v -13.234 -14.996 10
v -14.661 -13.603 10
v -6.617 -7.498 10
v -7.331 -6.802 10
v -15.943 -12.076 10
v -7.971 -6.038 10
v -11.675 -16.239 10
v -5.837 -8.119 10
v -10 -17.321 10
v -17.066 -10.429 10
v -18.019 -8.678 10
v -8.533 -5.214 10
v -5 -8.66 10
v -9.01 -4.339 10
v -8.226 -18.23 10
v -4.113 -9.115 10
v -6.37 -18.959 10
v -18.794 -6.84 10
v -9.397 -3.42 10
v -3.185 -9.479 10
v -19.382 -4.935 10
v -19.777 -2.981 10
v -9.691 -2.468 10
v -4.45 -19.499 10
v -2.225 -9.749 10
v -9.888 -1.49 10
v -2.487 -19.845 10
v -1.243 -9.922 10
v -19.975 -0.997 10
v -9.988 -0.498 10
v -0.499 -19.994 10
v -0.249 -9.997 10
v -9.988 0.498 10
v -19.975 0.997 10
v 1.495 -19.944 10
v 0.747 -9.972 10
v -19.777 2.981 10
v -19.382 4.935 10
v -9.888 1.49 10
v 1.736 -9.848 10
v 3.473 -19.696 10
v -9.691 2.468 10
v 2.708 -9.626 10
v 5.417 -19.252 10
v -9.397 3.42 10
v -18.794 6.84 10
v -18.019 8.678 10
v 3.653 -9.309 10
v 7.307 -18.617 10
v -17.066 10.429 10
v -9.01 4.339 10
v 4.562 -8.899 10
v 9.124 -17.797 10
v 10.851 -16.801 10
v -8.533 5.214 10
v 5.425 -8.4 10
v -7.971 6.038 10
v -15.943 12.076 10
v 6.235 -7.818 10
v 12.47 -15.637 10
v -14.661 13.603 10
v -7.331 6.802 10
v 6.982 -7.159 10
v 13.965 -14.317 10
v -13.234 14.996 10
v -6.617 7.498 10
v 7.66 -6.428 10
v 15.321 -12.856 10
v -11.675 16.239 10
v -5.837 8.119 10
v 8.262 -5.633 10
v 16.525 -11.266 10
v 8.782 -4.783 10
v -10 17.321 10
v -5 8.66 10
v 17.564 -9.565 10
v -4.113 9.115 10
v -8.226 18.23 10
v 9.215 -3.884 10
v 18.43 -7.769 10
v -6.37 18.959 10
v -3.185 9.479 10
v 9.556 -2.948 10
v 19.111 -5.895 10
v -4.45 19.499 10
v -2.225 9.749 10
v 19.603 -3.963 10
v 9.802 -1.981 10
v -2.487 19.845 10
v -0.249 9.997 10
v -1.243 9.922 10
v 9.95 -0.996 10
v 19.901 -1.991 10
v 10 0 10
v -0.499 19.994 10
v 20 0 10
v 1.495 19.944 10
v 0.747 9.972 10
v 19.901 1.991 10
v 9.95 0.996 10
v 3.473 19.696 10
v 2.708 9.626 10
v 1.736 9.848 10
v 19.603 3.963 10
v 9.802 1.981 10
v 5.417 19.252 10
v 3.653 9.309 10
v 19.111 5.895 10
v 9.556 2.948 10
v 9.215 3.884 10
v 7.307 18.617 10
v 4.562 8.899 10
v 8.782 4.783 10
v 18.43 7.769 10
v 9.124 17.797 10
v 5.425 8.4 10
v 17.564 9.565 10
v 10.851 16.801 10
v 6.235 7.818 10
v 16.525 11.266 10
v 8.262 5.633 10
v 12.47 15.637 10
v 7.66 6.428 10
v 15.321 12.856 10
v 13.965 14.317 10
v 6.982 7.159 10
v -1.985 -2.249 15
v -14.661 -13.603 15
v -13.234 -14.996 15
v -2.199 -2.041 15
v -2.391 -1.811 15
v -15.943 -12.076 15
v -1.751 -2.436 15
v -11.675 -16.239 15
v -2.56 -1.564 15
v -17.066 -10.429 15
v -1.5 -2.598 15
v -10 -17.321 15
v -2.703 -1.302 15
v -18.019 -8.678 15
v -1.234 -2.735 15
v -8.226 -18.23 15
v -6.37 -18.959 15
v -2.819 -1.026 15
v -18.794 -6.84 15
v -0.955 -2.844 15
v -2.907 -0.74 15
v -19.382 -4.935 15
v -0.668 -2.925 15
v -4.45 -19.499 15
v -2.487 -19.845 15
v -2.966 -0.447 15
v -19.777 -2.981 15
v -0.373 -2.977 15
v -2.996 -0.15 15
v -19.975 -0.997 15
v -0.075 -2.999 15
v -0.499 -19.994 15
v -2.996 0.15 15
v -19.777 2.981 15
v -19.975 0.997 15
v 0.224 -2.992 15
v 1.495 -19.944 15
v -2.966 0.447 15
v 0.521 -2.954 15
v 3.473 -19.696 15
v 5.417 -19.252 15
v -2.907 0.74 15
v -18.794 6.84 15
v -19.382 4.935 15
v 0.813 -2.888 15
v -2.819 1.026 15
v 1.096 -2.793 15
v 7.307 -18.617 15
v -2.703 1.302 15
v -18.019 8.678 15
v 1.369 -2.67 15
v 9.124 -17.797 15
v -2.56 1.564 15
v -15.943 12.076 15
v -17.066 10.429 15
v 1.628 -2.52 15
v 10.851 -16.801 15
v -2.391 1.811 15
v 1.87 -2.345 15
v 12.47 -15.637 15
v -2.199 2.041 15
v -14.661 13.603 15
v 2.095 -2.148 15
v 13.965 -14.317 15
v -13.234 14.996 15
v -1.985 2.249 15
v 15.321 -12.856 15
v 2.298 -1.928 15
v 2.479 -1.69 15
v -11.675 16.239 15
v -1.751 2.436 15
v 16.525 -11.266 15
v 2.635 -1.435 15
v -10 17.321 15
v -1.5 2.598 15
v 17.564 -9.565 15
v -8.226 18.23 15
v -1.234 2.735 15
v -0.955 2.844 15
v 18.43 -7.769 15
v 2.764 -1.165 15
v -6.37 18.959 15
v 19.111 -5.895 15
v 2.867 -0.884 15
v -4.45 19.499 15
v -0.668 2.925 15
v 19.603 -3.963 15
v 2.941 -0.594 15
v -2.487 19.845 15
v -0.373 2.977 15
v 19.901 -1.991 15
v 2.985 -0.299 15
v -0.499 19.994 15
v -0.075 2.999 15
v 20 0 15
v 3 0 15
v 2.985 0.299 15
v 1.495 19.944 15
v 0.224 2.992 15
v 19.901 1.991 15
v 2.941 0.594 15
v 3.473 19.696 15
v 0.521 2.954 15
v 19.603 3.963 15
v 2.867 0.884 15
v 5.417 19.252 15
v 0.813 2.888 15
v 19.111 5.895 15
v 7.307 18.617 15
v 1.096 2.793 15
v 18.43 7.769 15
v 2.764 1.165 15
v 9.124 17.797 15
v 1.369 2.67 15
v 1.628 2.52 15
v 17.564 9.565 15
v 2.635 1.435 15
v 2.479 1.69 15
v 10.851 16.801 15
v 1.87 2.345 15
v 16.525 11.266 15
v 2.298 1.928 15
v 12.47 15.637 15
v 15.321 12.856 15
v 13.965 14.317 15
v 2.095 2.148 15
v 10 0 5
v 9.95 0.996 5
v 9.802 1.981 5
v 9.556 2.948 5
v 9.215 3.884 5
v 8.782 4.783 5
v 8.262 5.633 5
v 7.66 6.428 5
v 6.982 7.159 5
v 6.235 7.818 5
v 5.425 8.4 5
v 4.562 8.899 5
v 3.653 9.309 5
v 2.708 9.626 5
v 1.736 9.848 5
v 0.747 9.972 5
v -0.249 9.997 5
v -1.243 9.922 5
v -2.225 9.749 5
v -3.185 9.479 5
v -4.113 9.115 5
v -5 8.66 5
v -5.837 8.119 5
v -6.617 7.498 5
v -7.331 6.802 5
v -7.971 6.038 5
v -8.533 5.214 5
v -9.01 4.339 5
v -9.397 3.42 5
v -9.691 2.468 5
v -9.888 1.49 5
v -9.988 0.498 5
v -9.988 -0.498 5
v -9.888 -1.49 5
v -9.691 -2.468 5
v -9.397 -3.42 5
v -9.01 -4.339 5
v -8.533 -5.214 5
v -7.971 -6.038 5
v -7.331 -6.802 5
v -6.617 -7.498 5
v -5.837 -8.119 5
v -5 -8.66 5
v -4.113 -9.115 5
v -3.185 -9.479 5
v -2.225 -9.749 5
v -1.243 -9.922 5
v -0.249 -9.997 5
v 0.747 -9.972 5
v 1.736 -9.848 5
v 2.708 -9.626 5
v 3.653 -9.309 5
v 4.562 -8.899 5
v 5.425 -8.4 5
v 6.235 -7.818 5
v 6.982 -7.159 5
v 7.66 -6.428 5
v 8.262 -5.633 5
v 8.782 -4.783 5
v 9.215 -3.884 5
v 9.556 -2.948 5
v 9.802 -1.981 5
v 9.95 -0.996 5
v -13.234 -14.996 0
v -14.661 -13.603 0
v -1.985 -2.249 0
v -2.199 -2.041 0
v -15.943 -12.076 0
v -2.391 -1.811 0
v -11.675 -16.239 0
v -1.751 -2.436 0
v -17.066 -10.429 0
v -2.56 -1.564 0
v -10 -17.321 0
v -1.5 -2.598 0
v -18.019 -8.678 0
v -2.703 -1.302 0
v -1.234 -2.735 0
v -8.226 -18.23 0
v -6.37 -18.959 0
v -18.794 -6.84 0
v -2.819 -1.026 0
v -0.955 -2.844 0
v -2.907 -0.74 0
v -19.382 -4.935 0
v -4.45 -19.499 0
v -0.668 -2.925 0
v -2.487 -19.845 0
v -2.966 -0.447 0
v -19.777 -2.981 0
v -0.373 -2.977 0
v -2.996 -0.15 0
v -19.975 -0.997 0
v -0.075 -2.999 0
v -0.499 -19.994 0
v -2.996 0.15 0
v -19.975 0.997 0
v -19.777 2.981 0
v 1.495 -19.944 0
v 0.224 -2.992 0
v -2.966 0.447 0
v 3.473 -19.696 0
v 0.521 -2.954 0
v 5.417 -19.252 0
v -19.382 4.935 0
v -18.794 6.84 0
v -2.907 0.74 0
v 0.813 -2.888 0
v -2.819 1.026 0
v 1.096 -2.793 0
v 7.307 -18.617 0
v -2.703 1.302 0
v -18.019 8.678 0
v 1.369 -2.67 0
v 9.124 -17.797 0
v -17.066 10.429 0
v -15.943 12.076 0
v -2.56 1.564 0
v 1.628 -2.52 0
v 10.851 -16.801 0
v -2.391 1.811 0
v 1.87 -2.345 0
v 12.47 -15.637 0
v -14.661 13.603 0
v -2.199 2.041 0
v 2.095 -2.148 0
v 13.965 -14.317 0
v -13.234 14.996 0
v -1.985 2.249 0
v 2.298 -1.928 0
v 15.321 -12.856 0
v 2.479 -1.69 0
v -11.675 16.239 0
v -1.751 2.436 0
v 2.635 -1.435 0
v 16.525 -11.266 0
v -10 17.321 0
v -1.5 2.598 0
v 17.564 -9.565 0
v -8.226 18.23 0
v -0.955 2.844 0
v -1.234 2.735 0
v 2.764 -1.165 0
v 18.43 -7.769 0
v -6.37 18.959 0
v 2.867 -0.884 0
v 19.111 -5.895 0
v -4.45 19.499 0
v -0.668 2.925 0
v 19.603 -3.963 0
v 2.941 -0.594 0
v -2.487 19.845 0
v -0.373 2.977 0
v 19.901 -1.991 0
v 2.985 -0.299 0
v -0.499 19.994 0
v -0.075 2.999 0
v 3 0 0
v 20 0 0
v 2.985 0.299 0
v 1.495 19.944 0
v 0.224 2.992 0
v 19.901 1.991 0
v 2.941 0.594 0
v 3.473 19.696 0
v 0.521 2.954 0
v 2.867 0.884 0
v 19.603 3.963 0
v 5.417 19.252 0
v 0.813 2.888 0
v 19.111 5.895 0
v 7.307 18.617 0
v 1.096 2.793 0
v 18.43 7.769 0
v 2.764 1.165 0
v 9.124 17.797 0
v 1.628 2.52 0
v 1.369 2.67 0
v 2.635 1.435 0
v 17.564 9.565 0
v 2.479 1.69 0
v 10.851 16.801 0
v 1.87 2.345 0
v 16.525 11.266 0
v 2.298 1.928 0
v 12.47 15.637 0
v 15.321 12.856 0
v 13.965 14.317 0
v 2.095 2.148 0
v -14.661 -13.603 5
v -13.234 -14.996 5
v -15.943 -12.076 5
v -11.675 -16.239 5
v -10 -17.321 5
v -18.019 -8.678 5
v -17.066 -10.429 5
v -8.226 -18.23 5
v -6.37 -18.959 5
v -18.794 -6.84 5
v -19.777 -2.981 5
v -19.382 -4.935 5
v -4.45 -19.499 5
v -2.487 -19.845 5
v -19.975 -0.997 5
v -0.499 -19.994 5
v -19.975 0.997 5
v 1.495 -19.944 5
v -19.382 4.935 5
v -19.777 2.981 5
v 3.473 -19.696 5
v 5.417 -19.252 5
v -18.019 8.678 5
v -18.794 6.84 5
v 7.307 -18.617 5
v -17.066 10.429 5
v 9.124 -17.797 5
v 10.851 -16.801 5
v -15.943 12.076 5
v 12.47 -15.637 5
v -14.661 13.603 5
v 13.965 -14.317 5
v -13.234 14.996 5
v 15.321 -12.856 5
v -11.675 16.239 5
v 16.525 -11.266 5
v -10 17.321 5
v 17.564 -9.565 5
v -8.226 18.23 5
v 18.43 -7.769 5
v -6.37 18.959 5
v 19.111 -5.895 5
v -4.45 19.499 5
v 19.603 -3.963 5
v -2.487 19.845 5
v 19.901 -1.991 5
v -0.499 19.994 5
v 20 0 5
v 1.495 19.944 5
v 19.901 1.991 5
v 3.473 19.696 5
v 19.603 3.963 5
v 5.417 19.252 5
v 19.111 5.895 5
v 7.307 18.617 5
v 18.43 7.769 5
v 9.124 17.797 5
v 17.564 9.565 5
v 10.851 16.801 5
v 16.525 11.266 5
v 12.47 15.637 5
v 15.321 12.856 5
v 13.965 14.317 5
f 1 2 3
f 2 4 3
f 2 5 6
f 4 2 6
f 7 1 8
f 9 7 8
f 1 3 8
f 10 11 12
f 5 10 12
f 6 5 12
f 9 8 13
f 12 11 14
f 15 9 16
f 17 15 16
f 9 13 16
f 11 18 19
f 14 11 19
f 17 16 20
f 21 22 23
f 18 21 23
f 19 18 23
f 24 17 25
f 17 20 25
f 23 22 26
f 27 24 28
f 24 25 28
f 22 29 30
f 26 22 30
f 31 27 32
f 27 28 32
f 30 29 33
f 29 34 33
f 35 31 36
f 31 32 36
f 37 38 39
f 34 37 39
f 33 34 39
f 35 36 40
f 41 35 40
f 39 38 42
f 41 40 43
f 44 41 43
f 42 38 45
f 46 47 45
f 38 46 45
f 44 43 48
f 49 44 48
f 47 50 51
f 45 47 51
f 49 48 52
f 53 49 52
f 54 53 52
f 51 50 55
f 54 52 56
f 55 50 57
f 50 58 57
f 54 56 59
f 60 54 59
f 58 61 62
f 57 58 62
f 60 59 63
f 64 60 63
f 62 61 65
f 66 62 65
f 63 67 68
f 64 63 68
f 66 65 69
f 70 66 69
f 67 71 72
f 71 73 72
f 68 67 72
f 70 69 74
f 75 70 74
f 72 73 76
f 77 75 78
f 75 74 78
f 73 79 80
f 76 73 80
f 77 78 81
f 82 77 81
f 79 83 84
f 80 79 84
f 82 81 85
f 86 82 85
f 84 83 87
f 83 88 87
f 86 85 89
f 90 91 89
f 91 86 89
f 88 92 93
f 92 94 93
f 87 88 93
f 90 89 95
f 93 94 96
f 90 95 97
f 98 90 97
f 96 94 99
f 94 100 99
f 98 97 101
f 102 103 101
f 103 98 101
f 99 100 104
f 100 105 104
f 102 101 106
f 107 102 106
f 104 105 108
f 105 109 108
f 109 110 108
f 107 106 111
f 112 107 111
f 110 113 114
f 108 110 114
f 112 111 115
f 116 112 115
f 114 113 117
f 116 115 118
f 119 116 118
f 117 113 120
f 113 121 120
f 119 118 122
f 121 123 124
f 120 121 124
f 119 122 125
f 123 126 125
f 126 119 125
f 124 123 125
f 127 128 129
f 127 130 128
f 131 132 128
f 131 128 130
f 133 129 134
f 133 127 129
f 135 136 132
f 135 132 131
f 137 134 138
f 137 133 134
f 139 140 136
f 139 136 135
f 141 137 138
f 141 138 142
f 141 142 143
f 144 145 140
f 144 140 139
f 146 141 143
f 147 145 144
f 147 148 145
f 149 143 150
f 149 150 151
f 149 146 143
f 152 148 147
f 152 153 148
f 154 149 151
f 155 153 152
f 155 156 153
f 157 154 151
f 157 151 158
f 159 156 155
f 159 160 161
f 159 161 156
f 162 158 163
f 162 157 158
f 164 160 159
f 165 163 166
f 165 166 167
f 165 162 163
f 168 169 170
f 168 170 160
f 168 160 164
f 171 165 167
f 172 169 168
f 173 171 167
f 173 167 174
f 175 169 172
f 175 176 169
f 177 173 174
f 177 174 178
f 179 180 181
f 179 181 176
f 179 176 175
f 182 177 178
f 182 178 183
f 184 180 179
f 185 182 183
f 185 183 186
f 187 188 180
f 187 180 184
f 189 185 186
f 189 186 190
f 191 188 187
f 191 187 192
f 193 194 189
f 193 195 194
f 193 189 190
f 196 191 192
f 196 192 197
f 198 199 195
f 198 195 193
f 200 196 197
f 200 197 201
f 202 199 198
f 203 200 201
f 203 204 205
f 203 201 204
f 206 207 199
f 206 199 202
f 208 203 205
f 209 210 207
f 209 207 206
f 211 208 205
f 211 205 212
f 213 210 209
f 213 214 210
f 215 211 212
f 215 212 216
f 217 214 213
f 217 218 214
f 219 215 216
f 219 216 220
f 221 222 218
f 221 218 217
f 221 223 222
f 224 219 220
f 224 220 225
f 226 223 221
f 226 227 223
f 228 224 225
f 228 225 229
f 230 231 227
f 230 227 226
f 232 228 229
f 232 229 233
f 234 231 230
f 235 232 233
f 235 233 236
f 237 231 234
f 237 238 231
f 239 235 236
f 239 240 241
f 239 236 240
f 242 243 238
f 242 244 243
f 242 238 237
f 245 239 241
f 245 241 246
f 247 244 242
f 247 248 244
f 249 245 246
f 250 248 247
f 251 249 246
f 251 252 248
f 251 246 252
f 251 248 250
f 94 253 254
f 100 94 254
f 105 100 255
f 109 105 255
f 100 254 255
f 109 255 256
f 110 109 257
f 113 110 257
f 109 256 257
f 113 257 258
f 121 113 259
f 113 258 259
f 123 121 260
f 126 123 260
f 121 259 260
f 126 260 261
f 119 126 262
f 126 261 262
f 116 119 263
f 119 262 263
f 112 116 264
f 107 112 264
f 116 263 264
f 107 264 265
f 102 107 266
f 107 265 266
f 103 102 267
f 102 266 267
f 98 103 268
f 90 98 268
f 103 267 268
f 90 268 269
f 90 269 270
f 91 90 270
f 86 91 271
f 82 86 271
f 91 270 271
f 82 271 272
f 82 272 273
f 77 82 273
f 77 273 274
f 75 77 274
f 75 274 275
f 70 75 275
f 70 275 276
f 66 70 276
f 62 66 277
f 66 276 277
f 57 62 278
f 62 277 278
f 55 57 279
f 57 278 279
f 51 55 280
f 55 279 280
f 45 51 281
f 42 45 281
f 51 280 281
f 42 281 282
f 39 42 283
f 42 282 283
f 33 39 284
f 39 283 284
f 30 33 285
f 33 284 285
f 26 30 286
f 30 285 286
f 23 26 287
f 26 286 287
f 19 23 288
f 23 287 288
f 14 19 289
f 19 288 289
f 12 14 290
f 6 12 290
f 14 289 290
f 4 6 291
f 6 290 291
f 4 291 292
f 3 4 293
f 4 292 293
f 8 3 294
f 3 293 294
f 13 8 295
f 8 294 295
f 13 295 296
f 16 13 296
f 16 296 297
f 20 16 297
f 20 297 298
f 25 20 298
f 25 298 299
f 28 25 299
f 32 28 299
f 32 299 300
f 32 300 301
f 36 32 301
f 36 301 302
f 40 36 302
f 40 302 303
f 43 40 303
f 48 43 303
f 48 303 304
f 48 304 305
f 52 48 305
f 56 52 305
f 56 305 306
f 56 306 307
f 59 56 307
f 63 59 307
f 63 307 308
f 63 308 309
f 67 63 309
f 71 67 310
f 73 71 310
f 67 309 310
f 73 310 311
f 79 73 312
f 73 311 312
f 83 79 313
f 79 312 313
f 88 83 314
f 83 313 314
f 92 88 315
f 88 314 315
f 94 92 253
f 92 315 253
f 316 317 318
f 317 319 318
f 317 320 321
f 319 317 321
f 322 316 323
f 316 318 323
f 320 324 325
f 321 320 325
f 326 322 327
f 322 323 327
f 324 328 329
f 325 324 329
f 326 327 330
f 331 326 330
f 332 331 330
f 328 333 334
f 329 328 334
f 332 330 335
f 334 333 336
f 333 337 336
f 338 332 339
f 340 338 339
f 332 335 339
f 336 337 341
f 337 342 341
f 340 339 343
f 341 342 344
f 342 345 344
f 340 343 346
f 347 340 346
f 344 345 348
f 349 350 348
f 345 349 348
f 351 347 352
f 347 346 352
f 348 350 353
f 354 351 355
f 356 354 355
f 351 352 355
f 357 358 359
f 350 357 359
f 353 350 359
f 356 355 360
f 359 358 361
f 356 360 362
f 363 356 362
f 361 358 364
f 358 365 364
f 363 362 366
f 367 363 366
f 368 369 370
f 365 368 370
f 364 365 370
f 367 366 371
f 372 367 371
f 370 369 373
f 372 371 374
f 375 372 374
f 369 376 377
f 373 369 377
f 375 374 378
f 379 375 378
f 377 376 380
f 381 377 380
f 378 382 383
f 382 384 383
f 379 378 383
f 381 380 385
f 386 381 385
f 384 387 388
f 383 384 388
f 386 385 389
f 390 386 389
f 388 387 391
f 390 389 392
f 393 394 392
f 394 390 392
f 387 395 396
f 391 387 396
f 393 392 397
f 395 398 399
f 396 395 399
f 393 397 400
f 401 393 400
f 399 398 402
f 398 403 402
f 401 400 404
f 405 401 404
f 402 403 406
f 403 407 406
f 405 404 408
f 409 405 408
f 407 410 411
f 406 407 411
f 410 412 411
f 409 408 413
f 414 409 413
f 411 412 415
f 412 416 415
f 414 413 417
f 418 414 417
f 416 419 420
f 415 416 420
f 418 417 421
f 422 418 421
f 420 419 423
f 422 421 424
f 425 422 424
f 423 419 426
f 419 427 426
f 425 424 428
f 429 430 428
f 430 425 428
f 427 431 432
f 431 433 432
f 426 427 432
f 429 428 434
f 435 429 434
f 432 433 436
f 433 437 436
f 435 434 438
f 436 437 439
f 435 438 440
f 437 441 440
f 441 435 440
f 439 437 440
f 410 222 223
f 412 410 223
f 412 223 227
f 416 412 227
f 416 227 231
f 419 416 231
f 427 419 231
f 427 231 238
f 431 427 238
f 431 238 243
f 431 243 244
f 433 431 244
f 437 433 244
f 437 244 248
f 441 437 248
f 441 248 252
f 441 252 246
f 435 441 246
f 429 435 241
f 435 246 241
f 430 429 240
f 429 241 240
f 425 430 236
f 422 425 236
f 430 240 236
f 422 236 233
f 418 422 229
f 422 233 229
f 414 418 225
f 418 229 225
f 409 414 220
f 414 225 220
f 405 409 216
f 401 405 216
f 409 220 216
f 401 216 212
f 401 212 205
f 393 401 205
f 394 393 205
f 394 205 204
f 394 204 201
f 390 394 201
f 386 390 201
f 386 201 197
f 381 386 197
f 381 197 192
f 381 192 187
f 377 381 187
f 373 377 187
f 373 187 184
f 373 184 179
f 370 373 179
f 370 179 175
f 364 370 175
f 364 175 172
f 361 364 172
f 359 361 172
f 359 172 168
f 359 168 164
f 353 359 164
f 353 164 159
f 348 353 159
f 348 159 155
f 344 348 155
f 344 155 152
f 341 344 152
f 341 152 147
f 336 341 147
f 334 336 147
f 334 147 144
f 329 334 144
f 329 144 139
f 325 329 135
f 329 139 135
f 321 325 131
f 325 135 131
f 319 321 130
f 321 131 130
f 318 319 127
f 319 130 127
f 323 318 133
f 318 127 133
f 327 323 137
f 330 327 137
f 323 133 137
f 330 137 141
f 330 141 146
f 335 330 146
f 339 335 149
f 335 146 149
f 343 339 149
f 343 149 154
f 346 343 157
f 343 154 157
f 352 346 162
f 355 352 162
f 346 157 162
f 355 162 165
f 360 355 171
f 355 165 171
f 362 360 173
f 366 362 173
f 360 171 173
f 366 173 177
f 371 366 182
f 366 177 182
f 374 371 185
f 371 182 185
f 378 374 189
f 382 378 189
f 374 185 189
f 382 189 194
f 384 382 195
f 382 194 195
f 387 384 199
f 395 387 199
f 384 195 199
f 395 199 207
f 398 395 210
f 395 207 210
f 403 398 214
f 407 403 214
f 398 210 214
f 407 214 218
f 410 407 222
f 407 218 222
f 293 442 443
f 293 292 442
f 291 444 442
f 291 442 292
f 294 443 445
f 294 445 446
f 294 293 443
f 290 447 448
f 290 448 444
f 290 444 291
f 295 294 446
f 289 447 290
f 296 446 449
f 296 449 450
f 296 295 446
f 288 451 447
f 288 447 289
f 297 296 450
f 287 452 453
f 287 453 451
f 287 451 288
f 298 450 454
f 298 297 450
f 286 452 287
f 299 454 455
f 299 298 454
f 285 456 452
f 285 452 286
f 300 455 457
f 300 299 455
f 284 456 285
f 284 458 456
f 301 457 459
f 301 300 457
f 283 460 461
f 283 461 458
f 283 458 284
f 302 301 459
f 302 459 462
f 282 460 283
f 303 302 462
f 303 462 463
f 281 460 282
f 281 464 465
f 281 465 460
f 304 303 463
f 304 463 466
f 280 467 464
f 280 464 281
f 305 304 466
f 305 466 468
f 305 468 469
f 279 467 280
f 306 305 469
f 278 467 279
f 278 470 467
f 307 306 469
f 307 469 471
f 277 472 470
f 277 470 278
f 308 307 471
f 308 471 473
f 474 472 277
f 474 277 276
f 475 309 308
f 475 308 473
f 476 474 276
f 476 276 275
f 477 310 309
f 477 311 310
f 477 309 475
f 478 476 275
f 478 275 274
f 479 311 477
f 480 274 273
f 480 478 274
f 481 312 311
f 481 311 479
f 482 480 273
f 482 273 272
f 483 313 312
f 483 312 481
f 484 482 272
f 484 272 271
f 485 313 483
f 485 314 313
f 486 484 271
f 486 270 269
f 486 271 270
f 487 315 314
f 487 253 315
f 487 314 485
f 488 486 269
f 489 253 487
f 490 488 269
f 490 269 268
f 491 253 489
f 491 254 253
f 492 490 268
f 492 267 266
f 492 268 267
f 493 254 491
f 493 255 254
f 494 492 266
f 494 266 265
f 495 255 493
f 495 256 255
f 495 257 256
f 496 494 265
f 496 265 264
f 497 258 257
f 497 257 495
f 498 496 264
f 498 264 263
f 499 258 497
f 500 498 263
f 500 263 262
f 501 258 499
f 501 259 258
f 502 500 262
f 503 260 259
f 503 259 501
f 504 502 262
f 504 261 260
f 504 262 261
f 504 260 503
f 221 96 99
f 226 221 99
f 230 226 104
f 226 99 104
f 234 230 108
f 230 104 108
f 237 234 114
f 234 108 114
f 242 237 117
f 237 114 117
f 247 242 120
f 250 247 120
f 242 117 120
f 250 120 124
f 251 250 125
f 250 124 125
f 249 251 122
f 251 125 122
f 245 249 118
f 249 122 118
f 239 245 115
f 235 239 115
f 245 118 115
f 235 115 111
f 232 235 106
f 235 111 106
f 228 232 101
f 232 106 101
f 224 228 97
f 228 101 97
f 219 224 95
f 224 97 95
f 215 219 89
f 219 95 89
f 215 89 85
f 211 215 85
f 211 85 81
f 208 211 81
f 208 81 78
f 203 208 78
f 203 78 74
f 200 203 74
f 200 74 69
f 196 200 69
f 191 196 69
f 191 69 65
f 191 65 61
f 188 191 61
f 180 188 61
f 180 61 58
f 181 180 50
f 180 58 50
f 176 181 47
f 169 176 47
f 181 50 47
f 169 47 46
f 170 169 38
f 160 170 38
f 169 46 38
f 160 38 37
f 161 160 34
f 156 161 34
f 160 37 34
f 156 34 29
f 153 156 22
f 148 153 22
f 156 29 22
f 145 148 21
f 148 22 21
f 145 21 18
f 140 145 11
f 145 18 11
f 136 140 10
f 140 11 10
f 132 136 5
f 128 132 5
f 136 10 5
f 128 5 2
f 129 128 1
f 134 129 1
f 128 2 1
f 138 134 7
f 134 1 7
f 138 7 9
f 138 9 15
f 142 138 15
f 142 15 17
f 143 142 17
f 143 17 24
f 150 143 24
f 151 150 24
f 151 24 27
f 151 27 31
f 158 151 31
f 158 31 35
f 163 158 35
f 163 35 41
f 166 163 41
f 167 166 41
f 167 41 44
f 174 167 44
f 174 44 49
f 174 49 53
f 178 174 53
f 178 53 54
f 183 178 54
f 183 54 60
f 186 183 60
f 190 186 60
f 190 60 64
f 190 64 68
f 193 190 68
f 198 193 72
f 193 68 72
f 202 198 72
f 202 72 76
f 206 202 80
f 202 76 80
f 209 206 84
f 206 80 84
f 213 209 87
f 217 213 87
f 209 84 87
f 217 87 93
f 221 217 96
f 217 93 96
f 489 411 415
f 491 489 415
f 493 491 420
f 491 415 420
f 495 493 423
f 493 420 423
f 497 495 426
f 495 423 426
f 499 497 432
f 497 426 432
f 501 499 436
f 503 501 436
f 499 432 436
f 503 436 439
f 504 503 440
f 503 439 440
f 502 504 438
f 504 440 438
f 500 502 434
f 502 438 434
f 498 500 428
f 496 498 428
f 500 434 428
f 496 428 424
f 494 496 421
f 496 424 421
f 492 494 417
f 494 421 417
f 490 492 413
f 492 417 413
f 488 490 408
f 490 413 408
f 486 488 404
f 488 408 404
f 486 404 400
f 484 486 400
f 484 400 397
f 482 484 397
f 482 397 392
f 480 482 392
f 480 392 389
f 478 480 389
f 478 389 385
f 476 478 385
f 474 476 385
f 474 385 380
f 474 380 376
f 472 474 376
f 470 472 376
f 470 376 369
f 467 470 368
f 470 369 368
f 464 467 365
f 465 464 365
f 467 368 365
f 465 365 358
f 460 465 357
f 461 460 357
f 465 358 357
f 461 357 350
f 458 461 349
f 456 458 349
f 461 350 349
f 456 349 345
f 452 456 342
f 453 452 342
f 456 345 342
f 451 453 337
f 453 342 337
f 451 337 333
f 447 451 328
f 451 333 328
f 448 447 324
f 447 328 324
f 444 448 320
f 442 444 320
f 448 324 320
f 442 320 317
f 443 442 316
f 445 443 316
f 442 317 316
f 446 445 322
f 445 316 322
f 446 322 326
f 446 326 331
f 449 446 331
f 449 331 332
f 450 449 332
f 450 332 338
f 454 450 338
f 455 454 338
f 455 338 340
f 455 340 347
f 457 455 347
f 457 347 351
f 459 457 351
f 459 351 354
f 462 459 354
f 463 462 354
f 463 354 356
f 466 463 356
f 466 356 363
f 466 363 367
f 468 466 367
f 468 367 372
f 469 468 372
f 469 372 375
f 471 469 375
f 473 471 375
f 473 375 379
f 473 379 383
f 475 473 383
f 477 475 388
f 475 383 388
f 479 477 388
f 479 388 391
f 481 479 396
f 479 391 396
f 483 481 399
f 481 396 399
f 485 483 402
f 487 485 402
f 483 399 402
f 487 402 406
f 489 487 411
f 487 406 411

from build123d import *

# Parameters (mm, degrees)
SKETCH1_R           = 20
BOSS_EXTRUDE1_DEPTH = 5
SKETCH2_R           = 10
BOSS_EXTRUDE2_DEPTH = 5
SKETCH3_R           = 20
BOSS_EXTRUDE3_DEPTH = 5
SKETCH4_R           = 3
CUT_EXTRUDE1_DEPTH  = 33.015621187


with BuildPart() as part:
    # Sketch1 → Boss-Extrude1 (new body)
    with BuildSketch(Plane.XY):
        Circle(SKETCH1_R)
    extrude(amount=BOSS_EXTRUDE1_DEPTH)

    # Sketch2 → Boss-Extrude2 (add)
    with BuildSketch(Plane.XY.offset(5)):
        Circle(SKETCH2_R)
    extrude(amount=BOSS_EXTRUDE2_DEPTH)

    # Sketch3 → Boss-Extrude3 (add)
    with BuildSketch(Plane.XY.offset(10)):
        Circle(SKETCH3_R)
    extrude(amount=BOSS_EXTRUDE3_DEPTH)

    # Sketch4 → Cut-Extrude1 (cut, through all)
    with BuildSketch(Plane.XY.offset(15)):
        Circle(SKETCH4_R)
    extrude(amount=-CUT_EXTRUDE1_DEPTH, mode=Mode.SUBTRACT)


solid = part.part
